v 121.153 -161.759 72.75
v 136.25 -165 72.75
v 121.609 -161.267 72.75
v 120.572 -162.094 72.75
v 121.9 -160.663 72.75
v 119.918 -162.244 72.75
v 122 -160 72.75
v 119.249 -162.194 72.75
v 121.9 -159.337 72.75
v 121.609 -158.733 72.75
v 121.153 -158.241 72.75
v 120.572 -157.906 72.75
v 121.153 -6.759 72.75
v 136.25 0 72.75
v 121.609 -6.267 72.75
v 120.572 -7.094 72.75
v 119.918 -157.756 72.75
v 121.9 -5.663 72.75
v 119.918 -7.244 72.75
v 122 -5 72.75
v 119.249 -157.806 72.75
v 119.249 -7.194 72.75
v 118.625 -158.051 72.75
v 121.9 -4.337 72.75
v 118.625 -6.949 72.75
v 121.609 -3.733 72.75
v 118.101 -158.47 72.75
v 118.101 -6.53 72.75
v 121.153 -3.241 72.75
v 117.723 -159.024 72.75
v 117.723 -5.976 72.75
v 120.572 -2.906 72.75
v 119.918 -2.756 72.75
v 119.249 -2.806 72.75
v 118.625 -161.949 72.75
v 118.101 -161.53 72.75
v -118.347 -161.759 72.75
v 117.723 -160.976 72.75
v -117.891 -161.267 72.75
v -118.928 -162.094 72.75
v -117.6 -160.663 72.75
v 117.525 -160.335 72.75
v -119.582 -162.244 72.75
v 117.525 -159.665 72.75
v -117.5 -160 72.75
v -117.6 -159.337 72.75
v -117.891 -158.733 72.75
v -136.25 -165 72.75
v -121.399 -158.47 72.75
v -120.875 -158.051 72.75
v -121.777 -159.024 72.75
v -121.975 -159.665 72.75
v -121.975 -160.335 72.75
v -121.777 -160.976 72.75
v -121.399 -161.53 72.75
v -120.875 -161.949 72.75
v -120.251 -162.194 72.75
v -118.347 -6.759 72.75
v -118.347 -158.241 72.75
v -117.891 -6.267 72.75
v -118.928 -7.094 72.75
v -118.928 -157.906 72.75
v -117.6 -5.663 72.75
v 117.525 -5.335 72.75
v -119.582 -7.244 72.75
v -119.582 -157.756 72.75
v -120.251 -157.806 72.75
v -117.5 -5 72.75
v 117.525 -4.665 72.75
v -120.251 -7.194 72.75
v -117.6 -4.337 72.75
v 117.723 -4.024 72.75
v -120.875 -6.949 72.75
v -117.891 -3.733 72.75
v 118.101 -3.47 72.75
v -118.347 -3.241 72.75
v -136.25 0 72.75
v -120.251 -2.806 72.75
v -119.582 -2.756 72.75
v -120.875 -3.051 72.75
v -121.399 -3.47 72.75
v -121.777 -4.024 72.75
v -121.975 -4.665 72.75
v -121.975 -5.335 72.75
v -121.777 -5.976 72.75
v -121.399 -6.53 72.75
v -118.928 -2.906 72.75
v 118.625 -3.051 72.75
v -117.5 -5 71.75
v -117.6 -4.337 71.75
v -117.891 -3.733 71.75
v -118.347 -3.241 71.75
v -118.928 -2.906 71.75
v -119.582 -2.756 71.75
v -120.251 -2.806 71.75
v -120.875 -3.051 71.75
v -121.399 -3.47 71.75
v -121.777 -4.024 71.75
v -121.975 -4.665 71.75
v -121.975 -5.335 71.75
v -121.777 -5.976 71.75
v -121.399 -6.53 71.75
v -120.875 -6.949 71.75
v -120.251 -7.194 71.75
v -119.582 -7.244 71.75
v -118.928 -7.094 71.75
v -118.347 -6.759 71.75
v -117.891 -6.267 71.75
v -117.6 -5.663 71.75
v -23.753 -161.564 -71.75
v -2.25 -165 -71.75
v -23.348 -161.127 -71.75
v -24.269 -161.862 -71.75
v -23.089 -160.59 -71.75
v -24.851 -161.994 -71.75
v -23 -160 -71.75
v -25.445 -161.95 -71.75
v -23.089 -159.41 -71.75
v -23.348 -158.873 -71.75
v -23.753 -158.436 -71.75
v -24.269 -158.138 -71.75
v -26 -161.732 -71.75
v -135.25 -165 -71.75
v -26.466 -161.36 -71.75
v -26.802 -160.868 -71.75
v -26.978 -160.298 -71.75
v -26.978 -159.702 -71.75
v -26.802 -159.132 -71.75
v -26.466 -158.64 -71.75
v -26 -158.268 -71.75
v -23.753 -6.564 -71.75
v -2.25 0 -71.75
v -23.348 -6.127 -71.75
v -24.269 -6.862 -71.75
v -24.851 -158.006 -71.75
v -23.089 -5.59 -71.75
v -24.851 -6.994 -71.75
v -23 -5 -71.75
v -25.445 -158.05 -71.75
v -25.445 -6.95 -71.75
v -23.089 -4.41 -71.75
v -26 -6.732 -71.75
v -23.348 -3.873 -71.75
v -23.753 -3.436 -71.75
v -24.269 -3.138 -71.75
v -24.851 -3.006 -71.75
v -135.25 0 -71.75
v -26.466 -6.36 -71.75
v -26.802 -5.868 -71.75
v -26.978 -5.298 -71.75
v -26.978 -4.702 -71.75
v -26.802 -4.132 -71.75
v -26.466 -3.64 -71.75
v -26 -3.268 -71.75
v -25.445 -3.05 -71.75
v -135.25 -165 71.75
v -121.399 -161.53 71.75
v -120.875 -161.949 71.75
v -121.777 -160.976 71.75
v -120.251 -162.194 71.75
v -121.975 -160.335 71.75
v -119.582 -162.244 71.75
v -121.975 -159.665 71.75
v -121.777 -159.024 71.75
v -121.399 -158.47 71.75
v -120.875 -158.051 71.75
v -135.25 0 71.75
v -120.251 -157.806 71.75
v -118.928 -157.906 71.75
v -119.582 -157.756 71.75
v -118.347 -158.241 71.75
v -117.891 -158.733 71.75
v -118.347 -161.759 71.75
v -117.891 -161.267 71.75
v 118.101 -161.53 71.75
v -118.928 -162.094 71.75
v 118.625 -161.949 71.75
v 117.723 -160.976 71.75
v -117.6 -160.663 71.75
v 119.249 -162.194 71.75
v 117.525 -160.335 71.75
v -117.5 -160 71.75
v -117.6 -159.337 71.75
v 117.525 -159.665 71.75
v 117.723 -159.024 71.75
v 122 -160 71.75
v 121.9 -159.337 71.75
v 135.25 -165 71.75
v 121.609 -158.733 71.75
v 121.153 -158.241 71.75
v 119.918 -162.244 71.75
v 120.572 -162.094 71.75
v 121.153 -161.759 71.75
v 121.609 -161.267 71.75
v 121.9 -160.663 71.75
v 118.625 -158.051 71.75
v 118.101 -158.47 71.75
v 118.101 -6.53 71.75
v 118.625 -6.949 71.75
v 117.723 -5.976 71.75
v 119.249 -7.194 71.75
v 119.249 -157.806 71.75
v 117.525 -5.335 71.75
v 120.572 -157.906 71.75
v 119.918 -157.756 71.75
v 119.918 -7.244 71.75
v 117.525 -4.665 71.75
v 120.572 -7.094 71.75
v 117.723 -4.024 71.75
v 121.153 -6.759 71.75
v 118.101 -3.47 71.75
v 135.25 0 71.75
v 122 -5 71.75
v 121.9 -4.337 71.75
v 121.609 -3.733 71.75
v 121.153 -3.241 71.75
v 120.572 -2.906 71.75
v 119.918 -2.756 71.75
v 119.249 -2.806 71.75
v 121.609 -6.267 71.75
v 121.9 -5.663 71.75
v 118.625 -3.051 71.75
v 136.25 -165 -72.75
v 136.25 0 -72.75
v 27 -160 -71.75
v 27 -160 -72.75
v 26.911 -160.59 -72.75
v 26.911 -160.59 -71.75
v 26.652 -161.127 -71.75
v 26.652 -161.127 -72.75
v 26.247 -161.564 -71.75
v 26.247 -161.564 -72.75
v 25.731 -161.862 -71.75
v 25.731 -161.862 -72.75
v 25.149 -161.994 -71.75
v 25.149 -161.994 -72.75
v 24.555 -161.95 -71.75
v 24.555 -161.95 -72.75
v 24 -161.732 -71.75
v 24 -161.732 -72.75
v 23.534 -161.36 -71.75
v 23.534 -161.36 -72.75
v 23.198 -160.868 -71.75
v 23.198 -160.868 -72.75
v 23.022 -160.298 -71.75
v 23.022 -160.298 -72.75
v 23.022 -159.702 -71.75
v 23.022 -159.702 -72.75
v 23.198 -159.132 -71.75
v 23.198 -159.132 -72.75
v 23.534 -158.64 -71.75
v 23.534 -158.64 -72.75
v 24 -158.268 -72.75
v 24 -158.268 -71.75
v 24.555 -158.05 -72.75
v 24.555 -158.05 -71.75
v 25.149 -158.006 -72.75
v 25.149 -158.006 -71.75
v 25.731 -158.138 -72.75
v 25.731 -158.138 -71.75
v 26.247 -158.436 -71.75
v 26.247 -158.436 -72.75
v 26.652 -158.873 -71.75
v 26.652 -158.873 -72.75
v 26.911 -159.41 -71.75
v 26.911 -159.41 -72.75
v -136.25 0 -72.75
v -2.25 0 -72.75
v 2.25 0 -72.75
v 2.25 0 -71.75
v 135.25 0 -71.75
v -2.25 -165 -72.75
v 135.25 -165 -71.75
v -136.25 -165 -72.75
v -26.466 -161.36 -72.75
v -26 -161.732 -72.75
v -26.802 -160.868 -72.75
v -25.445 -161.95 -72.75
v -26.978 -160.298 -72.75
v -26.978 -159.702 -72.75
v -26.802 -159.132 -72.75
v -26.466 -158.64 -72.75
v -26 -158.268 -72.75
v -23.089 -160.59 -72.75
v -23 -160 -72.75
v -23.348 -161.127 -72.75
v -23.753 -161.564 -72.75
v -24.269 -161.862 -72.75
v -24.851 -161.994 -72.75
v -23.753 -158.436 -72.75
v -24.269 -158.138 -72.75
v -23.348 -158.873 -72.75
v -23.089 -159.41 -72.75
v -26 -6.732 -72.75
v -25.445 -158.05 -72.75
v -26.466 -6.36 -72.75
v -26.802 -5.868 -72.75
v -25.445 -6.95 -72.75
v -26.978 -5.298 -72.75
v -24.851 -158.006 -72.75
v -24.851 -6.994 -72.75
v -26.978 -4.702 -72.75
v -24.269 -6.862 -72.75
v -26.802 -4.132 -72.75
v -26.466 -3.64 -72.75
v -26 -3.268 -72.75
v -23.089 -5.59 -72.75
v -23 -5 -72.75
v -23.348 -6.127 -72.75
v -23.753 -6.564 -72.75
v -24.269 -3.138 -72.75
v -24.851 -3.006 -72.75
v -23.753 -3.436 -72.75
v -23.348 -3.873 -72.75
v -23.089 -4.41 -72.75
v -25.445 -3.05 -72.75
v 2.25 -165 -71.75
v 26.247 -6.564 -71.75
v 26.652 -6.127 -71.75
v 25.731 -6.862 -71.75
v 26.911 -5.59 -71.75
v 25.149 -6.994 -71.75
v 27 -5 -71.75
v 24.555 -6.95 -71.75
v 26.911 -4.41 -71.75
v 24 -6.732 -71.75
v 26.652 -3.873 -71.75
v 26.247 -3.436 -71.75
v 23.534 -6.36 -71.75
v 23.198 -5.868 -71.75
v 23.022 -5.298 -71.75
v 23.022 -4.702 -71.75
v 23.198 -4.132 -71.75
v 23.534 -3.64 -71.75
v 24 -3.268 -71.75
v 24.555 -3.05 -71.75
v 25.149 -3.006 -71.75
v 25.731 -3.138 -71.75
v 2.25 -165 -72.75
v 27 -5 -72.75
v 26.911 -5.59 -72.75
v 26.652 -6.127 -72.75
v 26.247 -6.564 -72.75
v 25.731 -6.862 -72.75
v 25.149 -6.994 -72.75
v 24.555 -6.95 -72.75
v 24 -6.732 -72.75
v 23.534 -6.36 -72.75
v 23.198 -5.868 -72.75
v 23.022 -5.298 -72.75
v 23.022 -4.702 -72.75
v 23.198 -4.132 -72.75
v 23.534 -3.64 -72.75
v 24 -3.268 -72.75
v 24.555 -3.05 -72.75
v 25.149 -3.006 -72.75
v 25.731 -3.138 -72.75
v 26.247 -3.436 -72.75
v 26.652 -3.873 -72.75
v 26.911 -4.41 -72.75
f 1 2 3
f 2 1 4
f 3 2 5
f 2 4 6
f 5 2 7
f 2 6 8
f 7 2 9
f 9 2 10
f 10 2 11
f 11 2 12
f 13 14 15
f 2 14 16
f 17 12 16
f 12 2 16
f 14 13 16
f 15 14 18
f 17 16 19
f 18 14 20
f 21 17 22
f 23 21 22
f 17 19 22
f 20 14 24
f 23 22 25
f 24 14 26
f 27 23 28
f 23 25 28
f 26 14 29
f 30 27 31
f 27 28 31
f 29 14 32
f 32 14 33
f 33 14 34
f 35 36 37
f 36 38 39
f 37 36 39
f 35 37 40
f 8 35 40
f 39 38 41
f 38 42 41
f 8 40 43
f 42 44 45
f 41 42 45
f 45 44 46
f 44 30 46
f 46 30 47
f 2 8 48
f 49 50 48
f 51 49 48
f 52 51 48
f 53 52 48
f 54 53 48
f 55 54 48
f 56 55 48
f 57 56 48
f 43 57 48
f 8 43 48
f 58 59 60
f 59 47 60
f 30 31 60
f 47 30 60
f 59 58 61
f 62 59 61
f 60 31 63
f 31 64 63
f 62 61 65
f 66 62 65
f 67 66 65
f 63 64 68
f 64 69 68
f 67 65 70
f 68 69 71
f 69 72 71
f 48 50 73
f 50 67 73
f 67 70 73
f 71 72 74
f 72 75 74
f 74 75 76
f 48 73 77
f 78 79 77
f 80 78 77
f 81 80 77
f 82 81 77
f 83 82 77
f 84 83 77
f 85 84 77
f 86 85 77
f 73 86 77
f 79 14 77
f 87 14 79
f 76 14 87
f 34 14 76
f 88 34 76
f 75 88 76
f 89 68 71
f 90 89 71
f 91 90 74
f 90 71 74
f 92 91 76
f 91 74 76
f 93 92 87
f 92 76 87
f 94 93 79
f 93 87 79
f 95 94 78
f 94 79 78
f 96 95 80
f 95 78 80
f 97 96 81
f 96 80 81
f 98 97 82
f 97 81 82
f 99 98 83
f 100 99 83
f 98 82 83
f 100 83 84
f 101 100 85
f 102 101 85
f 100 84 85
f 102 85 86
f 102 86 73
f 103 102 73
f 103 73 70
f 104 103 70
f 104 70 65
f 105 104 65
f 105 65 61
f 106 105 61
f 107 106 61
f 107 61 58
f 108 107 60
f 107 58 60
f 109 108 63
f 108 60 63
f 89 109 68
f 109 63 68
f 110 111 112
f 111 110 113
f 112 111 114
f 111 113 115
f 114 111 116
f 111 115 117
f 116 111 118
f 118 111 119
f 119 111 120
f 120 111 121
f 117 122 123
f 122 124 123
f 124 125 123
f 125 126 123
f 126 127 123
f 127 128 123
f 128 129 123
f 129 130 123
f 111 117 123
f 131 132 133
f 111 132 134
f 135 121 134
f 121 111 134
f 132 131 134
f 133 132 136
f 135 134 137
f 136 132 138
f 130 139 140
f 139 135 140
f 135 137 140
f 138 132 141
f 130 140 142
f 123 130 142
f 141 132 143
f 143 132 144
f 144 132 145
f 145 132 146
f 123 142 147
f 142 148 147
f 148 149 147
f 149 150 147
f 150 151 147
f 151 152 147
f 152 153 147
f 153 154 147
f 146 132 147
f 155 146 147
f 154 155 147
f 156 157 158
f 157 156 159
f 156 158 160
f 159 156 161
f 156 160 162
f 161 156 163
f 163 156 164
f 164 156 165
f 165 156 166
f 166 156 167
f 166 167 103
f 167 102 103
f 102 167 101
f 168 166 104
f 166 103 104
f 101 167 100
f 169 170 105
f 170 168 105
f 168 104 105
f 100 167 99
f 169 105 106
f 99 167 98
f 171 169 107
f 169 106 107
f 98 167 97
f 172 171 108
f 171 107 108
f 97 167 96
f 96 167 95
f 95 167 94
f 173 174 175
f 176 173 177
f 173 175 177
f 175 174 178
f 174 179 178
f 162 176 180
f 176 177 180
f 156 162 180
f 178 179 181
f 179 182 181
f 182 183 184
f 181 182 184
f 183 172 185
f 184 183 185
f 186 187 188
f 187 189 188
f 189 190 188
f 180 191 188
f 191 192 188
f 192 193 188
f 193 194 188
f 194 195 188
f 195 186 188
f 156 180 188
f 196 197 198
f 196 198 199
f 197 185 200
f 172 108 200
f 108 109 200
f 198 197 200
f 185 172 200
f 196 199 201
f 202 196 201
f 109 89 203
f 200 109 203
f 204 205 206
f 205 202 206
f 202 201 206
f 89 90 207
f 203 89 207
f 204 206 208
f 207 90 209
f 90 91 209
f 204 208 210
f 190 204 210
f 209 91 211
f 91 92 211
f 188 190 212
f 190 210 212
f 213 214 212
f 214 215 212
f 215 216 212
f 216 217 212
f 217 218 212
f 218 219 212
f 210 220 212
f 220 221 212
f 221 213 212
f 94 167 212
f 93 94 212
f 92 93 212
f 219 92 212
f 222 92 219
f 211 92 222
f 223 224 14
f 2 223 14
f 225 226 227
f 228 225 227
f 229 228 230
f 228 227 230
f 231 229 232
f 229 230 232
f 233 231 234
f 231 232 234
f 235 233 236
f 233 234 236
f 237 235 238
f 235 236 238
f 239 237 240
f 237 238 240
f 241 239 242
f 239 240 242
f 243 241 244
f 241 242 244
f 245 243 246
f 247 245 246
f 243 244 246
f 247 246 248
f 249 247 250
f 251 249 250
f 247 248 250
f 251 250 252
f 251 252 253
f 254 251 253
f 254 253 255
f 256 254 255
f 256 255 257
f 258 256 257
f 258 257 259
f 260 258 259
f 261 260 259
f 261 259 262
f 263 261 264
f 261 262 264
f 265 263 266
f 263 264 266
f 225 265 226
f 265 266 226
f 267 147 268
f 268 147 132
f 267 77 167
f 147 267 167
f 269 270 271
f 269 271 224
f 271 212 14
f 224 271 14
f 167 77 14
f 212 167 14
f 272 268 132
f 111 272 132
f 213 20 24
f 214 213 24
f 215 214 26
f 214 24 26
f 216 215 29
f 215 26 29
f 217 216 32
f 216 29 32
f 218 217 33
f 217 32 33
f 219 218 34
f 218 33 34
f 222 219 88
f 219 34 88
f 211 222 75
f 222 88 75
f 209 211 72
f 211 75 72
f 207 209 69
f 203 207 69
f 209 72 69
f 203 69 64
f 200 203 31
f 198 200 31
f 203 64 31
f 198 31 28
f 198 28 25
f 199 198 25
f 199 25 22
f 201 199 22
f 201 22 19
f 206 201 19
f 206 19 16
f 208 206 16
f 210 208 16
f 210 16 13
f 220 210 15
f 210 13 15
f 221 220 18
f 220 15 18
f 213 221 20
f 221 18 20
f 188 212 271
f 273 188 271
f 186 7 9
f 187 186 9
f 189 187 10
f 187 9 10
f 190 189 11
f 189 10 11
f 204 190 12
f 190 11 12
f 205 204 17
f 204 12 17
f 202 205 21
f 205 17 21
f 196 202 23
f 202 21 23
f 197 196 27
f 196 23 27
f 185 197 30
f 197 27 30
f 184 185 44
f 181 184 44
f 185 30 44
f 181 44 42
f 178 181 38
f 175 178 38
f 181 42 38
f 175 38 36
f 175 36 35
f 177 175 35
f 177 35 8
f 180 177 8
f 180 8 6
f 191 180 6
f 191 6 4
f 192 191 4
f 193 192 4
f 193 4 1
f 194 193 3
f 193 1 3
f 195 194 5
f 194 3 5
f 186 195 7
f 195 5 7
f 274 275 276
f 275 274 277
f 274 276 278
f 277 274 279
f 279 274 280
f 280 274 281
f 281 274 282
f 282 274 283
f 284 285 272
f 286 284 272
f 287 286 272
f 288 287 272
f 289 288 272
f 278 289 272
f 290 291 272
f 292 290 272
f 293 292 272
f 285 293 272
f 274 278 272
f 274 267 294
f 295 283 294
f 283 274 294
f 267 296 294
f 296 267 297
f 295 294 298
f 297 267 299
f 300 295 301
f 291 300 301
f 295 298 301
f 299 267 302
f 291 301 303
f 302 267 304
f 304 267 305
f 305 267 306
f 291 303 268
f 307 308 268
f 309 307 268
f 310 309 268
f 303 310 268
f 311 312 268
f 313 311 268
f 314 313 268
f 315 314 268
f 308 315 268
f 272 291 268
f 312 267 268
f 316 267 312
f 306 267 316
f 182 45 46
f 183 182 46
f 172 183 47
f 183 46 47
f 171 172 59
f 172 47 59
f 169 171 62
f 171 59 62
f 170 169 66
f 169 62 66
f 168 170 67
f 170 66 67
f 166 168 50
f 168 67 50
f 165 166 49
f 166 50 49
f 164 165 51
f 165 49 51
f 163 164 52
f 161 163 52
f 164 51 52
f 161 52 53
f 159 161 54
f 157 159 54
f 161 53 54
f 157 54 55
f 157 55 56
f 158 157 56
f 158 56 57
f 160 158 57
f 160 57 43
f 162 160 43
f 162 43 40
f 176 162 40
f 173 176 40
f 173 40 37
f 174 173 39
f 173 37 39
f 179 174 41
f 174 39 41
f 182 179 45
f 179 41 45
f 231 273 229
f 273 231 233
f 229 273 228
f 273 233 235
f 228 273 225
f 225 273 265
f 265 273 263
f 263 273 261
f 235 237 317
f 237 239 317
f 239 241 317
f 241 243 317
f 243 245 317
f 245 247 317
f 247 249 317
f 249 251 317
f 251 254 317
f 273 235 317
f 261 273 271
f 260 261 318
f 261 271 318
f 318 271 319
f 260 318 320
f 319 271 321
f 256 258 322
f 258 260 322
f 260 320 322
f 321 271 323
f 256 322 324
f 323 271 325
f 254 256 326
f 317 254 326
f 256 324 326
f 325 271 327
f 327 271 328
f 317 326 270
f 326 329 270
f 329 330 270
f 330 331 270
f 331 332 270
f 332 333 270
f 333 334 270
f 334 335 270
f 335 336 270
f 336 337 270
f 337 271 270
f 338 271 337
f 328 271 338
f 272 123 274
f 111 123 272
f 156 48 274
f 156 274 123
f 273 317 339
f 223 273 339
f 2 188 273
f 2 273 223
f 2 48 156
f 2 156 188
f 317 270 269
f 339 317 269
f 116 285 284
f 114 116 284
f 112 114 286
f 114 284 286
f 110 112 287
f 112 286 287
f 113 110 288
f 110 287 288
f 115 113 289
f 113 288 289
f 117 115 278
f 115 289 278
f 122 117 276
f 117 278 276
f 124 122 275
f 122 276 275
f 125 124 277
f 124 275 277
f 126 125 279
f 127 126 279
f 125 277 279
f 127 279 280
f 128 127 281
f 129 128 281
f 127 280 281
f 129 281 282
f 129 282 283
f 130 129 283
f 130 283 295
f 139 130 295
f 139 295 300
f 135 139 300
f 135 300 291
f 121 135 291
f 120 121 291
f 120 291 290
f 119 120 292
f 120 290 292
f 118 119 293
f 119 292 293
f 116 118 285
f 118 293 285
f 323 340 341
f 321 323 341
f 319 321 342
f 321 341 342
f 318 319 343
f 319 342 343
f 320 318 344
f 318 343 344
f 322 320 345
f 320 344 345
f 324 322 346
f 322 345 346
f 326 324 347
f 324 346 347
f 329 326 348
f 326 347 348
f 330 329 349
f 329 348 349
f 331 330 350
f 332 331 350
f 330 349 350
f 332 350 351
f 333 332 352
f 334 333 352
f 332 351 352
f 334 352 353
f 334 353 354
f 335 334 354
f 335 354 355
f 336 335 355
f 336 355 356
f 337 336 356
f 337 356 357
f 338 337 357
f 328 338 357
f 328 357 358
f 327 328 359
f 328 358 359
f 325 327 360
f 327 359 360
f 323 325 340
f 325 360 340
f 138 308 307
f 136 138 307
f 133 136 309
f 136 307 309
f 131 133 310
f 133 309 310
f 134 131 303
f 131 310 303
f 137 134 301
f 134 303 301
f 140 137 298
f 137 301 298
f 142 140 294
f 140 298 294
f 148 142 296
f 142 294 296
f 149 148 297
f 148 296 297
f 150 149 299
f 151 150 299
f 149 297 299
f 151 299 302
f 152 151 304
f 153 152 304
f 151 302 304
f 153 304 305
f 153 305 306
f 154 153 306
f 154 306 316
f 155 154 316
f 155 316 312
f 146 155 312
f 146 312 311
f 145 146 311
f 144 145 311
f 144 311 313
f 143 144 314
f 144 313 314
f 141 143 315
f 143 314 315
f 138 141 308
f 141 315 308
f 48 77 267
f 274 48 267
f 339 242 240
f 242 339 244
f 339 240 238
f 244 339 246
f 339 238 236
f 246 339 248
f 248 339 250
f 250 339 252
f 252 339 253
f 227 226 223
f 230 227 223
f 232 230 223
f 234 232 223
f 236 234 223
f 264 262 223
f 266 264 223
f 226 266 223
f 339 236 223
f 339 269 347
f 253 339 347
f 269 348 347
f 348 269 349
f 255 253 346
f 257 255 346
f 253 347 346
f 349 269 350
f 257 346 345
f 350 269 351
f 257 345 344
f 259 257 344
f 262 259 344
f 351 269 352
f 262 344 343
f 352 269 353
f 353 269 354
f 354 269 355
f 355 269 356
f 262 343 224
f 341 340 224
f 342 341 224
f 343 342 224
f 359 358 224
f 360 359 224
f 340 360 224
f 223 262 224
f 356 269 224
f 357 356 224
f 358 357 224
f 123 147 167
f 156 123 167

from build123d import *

# Parameters (mm, degrees)
F1_DEPTH = 165
F2_R     = 2
F3_DEPTH = 1
F4_R     = 2.25
F5_DEPTH = 1


with BuildPart() as f1:
    # F0 (on Front) → F1 (new body)
    with BuildSketch(Plane.XZ):
        Polygon((136.25, 72.75), (-136.25, 72.75), (-136.25, -72.75), (-2.25, -72.75), (-2.25, -71.75), (-135.25, -71.75), (-135.25, 71.75), (135.25, 71.75), (135.25, -71.75), (2.25, -71.75), (2.25, -72.75), (136.25, -72.75), align=None)
    extrude(amount=F1_DEPTH)

    # F2 (on face) → F3 (cut, through all)
    with BuildSketch(Plane(origin=(0, 0, -72.75), x_dir=(1, 0, 0), z_dir=(0, 0, -1))):
        with Locations((25, 160)):
            Circle(F2_R)
        with Locations((-25, 160)):
            Circle(F2_R)
        with Locations((25, 5)):
            Circle(F2_R)
        with Locations((-25, 5)):
            Circle(F2_R)
    extrude(amount=-F3_DEPTH, mode=Mode.SUBTRACT)

    # F4 (on face) → F5 (cut, through all)
    with BuildSketch(Plane.XY.offset(72.75)):
        with Locations((-119.75, -5)):
            Circle(F4_R)
        with Locations((119.75, -5)):
            Circle(F4_R)
        with Locations((-119.75, -160)):
            Circle(F4_R)
        with Locations((119.75, -160)):
            Circle(F4_R)
    extrude(amount=-F5_DEPTH, mode=Mode.SUBTRACT)


solid = f1.part
